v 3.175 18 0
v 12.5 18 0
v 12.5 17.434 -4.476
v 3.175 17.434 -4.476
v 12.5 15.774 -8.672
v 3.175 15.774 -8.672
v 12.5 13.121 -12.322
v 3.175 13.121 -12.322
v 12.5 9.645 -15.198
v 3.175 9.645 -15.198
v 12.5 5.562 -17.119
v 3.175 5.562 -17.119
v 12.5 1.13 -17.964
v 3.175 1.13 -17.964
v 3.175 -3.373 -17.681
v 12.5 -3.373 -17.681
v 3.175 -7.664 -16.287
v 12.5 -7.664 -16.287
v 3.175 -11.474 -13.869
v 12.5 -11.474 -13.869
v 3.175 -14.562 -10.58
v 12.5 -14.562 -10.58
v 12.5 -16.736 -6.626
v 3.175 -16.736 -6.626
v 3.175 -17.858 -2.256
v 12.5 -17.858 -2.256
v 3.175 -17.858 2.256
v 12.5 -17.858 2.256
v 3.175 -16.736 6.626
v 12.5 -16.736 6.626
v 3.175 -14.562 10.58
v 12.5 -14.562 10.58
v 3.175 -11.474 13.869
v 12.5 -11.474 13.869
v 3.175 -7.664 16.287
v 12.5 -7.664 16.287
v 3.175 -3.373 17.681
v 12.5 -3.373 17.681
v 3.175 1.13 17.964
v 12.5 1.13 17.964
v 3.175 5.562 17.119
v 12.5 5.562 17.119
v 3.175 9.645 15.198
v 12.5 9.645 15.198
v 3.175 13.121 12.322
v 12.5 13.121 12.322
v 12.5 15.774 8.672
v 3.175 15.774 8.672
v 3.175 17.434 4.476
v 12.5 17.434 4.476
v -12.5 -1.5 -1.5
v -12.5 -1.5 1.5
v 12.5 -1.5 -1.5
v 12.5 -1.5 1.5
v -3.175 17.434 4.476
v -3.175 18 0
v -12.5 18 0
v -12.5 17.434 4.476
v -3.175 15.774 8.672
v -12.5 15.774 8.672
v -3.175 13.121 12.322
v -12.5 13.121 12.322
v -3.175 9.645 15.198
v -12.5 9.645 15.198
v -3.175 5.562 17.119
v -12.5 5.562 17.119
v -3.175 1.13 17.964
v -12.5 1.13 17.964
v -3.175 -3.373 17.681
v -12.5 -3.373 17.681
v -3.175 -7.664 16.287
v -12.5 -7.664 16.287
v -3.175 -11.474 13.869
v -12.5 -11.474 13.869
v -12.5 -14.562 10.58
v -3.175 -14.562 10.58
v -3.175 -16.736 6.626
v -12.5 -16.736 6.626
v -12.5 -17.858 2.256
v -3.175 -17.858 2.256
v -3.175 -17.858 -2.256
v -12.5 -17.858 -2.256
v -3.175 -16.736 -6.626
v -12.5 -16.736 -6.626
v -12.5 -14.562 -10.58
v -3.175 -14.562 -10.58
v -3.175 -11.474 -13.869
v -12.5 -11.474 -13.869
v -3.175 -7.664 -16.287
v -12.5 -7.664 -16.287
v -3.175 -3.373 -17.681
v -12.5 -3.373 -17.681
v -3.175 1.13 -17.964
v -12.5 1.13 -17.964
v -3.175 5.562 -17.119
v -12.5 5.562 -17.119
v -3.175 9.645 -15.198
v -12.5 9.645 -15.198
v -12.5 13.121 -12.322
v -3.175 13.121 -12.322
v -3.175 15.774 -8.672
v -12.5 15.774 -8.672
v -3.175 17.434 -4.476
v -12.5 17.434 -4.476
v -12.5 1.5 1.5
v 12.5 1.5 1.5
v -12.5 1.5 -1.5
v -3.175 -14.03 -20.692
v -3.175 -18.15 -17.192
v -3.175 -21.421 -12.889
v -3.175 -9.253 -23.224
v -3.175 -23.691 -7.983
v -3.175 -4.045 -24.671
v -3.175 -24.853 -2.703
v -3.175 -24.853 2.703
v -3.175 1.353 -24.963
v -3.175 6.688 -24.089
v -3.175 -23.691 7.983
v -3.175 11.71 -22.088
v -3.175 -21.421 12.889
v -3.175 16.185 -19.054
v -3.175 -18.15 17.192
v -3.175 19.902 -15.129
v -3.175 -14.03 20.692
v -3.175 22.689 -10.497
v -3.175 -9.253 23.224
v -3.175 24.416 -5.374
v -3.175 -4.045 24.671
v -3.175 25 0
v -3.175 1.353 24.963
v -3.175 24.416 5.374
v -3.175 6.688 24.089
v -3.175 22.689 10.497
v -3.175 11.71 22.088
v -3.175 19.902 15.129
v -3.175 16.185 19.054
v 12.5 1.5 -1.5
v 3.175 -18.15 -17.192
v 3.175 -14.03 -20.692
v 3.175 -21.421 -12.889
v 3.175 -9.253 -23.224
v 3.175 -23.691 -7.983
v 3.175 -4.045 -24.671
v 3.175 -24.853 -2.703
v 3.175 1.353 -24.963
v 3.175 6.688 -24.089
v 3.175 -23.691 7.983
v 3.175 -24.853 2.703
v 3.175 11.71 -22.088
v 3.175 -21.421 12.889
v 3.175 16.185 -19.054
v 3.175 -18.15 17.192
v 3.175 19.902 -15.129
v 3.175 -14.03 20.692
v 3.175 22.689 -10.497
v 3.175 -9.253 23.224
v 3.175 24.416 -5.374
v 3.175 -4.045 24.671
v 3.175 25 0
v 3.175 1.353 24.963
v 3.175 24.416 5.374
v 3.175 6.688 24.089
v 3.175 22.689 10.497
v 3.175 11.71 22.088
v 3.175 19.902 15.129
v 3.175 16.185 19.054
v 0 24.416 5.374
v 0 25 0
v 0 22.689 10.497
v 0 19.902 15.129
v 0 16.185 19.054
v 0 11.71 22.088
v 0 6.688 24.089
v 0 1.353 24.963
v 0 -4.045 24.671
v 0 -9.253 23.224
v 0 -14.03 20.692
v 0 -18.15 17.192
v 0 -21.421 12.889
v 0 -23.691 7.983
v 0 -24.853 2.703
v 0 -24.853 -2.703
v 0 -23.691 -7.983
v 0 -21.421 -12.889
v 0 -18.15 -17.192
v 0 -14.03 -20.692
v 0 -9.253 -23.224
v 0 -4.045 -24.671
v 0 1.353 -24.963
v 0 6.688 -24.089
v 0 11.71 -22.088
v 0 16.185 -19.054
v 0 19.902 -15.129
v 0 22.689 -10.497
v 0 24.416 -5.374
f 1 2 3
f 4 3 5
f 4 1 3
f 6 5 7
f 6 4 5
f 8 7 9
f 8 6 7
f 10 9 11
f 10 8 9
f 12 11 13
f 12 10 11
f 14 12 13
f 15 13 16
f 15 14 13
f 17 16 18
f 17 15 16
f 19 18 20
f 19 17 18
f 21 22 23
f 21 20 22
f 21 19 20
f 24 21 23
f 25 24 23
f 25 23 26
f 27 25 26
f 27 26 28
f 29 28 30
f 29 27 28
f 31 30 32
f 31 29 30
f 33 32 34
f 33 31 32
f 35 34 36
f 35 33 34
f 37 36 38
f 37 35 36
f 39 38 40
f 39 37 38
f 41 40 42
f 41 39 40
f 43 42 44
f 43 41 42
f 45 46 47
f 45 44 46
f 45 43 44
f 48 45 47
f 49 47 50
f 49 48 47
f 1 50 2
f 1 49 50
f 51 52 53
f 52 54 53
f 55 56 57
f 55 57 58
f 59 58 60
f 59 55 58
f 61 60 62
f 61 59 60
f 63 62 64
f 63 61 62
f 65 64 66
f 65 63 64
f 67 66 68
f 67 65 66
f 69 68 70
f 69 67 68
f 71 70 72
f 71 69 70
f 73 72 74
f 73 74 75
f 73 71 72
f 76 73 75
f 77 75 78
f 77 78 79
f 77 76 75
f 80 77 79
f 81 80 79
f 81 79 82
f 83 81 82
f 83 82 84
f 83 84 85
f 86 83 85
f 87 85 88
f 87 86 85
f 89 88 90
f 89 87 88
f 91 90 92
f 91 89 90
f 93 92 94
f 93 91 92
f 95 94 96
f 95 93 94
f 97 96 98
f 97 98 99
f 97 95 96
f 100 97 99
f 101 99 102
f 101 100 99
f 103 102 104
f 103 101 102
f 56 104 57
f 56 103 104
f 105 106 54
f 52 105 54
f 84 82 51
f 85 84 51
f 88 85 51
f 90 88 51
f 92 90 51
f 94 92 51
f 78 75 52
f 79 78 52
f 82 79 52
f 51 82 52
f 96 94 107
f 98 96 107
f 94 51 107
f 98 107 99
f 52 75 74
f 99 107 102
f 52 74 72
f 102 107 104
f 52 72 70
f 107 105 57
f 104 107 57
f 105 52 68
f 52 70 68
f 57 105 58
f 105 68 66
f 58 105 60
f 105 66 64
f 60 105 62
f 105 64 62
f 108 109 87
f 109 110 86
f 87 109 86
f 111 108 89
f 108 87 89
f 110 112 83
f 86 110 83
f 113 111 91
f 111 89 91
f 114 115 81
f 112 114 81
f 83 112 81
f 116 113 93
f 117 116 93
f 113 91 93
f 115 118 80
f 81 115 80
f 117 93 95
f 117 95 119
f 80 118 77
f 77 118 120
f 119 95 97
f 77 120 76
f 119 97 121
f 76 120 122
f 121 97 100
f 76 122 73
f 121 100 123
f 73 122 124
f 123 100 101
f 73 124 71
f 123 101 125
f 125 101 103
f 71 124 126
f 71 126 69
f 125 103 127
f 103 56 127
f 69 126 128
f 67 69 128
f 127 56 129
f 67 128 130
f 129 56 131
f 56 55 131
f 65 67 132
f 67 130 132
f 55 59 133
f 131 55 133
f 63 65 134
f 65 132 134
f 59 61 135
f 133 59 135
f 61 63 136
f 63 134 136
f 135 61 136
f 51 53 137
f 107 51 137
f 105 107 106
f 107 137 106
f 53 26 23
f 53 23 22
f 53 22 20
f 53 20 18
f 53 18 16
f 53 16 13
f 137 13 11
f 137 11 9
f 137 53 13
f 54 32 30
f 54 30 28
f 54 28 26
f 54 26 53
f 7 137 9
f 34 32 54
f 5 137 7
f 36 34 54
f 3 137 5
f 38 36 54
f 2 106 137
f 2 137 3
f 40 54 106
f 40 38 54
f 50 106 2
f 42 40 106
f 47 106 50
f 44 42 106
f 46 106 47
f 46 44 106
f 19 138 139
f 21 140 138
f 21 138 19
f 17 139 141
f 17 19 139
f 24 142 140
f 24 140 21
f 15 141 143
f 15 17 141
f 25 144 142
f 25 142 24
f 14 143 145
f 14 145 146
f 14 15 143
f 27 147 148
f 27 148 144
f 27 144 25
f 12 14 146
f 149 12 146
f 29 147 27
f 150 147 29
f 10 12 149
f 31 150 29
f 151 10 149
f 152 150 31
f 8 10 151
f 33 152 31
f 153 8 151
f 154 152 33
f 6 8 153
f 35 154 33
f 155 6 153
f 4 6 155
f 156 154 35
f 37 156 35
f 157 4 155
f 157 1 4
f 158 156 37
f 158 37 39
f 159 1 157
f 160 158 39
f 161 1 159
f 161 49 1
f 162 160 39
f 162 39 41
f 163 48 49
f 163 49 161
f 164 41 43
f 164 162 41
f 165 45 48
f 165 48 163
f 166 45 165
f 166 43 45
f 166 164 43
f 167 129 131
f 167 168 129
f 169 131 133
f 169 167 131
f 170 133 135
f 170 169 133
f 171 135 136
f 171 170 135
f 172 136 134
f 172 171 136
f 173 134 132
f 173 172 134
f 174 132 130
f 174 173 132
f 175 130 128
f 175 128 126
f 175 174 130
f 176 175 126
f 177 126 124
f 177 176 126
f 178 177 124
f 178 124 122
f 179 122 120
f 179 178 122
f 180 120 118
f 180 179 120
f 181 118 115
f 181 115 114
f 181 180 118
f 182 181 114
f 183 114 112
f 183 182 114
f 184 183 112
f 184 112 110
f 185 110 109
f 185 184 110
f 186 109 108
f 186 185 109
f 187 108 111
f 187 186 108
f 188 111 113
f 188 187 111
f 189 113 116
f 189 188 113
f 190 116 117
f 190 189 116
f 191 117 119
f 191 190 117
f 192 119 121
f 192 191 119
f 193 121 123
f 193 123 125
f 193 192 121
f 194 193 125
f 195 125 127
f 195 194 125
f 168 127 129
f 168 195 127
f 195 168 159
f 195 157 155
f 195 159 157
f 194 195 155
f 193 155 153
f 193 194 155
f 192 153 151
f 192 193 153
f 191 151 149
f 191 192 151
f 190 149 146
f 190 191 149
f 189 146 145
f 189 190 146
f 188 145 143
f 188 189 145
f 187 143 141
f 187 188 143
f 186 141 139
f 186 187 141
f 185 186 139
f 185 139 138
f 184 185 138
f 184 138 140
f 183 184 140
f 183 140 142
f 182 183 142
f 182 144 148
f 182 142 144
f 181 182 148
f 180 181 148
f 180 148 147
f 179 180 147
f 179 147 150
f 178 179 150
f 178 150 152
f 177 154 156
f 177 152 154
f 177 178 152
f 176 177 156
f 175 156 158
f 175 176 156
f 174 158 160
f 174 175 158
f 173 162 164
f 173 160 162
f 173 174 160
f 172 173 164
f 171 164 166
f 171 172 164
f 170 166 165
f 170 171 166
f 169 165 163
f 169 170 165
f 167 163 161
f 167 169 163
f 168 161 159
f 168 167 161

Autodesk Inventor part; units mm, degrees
ref_plane "YZ Plane" through (0, 0, 0) normal (1, 0, 0) x (0, 1, 0)
ref_plane "XZ Plane" through (0, 0, 0) normal (0, 1, 0) x (-1, 0, 0)
ref_plane "XY Plane" through (0, 0, 0) normal (0, 0, 1) x (1, 0, 0)
sketch "Sketch1" plane through (0, 0, 0) normal (1, 0, 0) x (0, 1, 0)
  circle A0 centre (0, 0) radius 18
  dimension "d0" = 36
extrude "Extrusion1" add sketch "Sketch1" along normal mid plane 25
sketch "Sketch2" plane through (0, 0, 0) normal (1, 0, 0) x (0, 1, 0)
  circle A0 centre (0, 0) radius 25
  dimension "d3" = 50
extrude "Extrusion2" add sketch "Sketch2" along normal mid plane 6.35
sketch "Sketch3" plane through (12.5, 0, 0) normal (1, 0, 0) x (0, 0, -1)
  line L0 (-1.5, -1.5) -> (1.5, -1.5)
  line L1 (1.5, -1.5) -> (1.5, 1.5)
  line L2 (1.5, 1.5) -> (-1.5, 1.5)
  line L3 (-1.5, 1.5) -> (-1.5, -1.5)
  line L4 (-1.5, -1.5) -> (1.5, 1.5) construction
  line L5 (1.5, -1.5) -> (-1.5, 1.5) construction
  point P0 (0, 0)
  dimension "d6" = 3
  dimension "d7" = 3
extrude "Extrusion3" cut sketch "Sketch3" against normal blind 25.4
properties part number "Sprocket"
